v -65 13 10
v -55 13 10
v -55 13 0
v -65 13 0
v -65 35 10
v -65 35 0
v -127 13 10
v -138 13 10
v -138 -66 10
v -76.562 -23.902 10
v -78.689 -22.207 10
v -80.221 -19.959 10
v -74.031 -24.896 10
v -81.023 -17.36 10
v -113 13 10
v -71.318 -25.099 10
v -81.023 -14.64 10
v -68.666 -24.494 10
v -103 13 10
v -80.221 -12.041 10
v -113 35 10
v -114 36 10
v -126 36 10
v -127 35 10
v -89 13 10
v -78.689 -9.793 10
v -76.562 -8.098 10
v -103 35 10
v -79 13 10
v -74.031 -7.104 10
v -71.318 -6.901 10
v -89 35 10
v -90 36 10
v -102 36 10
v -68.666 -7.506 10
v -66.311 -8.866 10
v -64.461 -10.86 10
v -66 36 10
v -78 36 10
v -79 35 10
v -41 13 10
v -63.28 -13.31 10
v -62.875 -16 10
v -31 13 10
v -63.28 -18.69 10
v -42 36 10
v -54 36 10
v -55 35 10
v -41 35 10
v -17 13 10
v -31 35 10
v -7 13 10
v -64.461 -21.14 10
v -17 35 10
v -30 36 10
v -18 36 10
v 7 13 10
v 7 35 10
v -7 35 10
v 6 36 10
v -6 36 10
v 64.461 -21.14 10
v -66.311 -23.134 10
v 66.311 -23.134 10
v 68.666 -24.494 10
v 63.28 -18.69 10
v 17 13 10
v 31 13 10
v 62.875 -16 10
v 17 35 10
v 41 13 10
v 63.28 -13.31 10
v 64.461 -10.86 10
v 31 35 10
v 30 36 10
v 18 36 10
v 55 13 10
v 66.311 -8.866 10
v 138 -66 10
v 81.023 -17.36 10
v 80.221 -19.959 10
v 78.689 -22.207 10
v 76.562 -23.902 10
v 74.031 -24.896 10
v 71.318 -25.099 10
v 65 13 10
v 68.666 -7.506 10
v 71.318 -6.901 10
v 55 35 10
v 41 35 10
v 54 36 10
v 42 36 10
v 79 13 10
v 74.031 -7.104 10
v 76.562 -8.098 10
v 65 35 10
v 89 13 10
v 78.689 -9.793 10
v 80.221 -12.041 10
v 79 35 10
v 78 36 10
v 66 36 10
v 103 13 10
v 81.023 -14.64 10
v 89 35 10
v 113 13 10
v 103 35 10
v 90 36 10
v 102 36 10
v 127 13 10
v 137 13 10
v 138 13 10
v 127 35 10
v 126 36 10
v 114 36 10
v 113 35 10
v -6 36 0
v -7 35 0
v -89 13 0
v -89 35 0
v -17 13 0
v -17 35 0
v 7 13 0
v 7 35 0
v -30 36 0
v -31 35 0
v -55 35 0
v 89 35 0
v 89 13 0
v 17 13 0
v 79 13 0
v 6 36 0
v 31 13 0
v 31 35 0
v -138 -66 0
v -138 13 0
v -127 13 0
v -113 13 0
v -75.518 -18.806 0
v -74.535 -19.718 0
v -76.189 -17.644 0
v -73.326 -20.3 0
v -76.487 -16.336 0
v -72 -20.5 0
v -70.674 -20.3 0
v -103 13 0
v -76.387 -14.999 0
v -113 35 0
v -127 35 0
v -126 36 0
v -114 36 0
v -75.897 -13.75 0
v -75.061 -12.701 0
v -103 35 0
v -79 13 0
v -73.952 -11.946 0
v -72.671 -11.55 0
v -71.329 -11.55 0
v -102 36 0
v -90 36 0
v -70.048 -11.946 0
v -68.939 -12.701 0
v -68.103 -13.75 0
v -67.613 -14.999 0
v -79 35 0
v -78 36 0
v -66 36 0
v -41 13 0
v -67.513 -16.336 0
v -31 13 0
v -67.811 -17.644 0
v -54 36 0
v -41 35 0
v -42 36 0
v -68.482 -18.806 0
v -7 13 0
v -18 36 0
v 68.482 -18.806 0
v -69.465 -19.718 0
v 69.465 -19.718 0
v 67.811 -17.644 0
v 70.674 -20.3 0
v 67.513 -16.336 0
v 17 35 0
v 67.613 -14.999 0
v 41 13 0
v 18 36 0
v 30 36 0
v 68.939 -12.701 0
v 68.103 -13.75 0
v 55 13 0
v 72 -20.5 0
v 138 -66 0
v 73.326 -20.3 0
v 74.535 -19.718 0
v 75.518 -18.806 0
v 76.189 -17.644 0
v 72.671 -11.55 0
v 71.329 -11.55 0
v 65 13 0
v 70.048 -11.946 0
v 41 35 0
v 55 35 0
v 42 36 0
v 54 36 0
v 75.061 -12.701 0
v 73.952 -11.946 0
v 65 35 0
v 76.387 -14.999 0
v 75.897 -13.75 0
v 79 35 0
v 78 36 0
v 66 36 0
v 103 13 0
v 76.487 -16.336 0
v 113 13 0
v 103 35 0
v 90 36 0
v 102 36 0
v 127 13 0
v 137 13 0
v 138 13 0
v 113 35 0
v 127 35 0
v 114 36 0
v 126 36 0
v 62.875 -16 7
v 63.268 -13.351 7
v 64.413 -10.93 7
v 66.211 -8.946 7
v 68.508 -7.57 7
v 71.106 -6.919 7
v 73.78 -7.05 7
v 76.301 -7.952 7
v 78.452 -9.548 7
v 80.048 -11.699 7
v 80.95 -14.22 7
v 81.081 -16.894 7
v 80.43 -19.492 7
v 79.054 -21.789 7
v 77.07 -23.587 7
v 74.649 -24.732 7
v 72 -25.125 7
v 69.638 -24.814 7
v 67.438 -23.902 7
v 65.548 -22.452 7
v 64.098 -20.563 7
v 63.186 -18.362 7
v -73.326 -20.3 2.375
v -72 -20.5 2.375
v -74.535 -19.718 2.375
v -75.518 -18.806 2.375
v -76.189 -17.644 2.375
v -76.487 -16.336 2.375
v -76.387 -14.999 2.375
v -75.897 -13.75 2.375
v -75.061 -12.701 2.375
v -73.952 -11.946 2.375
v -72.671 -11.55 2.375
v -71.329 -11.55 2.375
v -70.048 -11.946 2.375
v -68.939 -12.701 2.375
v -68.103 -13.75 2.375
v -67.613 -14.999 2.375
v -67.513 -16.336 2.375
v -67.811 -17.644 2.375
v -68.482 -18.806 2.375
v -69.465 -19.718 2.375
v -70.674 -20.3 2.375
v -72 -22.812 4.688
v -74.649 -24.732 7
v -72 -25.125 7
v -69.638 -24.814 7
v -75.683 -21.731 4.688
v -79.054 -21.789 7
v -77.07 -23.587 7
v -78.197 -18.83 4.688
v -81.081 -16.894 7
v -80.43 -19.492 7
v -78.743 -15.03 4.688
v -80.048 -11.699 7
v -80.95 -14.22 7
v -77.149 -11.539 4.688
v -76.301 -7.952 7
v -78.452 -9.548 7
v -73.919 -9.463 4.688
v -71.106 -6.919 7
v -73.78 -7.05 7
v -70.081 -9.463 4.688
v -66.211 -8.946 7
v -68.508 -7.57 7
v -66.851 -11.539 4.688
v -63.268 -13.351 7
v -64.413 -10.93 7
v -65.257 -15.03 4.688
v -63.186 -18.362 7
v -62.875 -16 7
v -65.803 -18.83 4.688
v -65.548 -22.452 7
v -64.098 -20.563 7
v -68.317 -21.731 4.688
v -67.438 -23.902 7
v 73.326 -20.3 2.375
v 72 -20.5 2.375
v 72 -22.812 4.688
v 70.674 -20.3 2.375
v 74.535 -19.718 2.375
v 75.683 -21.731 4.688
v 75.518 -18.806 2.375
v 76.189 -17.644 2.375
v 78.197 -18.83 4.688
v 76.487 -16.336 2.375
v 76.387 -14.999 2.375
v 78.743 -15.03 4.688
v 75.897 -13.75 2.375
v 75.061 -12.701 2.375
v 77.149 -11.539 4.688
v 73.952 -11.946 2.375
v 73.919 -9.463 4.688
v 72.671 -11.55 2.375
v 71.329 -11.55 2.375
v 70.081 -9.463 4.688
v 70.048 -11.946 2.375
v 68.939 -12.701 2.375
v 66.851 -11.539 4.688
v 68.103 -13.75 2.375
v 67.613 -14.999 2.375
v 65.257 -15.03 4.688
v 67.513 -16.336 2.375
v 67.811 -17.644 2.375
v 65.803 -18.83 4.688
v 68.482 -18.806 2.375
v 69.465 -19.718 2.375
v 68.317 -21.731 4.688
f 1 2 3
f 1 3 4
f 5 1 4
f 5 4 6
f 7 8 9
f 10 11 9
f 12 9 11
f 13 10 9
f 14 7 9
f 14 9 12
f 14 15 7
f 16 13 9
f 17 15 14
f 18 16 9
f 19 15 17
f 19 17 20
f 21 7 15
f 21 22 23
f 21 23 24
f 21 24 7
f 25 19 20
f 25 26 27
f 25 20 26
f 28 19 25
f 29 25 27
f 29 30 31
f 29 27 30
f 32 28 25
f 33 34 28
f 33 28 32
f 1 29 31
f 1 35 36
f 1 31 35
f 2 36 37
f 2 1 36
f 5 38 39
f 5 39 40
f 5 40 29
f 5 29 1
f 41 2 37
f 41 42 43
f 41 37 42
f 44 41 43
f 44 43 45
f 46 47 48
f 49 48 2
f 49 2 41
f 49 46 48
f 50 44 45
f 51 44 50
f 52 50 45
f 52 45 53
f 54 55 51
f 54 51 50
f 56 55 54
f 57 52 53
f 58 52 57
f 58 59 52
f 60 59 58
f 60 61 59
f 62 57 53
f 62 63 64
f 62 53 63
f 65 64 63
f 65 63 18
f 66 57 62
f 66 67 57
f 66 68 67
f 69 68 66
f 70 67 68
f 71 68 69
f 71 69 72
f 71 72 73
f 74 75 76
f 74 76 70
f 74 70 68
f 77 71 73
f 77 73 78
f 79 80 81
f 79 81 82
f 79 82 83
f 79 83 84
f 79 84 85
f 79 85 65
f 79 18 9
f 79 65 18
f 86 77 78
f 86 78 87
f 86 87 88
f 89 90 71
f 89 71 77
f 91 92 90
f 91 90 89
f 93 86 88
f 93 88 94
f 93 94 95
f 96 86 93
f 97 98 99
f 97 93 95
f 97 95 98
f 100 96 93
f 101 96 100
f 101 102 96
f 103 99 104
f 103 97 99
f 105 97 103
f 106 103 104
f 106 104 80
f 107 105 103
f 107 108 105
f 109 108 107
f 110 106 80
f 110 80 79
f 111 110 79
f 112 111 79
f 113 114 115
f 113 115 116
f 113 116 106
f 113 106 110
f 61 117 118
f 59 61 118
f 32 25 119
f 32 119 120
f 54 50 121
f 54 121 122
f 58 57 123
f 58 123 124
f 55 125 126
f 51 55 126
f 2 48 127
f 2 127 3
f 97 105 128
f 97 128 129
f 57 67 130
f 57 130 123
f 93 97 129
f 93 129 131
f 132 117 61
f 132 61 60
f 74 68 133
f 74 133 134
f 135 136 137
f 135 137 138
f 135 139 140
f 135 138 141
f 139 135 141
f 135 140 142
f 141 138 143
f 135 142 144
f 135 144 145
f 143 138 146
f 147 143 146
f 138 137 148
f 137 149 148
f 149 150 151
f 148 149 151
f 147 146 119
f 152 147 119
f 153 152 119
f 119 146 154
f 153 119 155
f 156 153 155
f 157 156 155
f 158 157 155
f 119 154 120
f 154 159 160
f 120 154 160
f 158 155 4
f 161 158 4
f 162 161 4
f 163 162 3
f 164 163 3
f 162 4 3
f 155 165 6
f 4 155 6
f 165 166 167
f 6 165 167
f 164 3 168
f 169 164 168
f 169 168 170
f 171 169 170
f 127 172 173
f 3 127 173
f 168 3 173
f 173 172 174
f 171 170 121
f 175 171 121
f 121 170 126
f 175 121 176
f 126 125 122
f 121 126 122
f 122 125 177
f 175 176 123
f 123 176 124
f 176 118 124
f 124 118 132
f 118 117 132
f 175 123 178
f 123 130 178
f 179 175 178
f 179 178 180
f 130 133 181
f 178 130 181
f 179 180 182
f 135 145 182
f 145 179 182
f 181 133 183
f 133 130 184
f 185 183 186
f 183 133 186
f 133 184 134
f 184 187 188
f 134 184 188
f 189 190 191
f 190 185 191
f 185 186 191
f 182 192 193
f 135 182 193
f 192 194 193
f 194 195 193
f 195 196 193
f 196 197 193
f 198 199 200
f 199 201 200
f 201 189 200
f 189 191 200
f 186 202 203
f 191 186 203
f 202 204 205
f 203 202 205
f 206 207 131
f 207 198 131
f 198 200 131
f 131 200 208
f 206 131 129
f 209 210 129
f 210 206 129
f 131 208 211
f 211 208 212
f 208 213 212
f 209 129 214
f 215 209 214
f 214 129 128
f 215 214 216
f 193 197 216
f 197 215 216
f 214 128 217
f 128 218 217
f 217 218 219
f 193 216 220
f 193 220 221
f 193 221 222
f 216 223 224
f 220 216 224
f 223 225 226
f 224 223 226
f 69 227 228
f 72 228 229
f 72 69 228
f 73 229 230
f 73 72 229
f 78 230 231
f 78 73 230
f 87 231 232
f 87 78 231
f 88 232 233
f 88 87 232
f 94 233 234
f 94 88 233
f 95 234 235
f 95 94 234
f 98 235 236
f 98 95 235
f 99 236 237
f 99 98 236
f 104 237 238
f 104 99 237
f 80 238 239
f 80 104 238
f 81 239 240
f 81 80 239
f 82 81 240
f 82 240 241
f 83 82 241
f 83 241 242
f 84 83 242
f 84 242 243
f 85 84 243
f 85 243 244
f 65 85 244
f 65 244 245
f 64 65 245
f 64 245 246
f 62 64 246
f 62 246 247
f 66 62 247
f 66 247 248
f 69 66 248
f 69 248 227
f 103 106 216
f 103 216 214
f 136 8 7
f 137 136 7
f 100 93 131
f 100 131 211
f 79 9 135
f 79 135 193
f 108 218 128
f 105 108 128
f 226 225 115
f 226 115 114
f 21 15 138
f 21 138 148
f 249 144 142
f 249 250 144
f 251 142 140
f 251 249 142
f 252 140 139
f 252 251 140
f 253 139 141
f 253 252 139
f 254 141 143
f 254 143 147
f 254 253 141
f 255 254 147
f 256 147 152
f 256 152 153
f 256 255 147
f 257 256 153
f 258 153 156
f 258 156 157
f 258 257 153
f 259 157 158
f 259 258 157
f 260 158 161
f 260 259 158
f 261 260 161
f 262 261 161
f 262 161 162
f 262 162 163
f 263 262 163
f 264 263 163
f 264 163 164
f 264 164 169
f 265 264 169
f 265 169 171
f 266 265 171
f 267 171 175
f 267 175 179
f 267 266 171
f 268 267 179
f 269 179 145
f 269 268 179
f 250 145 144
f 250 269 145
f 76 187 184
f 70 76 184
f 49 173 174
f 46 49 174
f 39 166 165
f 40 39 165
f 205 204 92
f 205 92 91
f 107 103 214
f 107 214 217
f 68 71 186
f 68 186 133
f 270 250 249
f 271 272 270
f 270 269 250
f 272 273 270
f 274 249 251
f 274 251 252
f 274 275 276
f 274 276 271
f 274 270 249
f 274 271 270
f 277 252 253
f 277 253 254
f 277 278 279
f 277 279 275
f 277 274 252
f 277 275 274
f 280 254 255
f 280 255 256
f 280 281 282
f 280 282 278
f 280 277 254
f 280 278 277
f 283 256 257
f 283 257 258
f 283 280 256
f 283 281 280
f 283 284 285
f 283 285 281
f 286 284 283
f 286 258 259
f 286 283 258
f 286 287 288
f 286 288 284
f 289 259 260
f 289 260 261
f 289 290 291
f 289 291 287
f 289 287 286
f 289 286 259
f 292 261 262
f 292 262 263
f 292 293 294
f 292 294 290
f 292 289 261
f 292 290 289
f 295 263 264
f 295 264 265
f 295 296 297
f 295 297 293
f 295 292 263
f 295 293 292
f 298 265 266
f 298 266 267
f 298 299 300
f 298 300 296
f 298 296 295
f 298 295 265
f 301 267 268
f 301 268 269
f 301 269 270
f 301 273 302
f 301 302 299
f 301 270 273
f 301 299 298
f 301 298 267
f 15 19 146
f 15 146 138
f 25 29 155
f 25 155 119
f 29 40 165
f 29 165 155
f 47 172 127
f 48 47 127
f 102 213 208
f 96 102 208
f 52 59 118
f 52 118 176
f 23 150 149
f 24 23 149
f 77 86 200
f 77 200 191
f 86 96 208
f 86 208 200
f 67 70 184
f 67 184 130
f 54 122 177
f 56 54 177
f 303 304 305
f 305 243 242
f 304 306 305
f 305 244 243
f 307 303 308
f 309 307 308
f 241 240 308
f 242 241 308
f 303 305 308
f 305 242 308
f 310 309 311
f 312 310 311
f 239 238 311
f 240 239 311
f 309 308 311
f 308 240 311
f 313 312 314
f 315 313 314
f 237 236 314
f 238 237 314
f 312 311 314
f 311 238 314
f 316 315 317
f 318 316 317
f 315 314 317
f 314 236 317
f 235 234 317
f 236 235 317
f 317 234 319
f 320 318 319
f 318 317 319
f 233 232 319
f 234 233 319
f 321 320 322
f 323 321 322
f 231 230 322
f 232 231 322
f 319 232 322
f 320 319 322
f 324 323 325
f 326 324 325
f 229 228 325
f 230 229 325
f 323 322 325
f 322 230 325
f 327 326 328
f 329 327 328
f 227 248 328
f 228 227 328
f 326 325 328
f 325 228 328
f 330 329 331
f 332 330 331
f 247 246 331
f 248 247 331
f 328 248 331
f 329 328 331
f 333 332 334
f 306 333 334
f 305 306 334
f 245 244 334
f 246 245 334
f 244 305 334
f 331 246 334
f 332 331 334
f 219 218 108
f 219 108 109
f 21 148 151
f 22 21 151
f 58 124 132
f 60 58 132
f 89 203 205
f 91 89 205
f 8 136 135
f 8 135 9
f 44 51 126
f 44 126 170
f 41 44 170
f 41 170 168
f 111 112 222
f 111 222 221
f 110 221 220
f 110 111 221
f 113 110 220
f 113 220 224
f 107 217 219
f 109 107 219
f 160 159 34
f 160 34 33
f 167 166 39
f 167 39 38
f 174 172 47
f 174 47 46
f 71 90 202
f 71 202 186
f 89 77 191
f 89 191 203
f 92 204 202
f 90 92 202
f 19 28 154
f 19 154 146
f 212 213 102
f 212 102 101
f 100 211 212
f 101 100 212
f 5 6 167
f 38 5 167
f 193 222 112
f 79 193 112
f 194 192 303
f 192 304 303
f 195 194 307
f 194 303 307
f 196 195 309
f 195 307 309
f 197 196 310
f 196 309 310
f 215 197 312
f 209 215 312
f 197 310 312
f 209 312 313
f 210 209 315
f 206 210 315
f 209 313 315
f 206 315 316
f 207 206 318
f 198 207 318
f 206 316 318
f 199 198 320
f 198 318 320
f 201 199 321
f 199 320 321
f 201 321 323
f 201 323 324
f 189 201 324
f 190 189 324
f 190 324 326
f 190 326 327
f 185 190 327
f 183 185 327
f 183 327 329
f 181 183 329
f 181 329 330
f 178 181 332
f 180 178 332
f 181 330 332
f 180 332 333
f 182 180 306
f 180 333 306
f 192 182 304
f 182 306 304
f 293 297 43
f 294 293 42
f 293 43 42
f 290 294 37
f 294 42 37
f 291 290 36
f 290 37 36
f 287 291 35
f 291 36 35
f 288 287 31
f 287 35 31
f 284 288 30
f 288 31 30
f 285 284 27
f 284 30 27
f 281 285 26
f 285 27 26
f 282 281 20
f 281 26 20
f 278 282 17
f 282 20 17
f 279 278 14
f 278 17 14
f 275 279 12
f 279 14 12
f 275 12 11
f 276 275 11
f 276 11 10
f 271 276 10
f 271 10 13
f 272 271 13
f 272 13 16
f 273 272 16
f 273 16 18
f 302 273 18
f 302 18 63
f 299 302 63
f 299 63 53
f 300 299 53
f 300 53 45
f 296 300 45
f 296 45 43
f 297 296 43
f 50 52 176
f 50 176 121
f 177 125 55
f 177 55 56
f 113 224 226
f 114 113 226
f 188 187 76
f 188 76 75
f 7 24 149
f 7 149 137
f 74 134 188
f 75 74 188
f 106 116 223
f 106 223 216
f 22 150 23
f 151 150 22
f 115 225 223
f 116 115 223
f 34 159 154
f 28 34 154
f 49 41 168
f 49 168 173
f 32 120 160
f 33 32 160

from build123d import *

# Parameters (mm, degrees)
SKETCH_1_W                  = 276
SKETCH_1_H                  = 72
EXTRUDE_1_DEPTH             = 10
CUT_EXTRUDE_1_DEPTH         = 10
SKETCH_6_W                  = 276
SKETCH_6_H                  = 10
EXTRUDE_2_DEPTH             = 30
PATTERN_LINEAR_2_COUNT      = 7
PATTERN_LINEAR_2_PITCH      = 24
PATTERN_LINEAR_2_COUNT_DIR2 = 7
PATTERN_LINEAR_2_PITCH_DIR2 = 24
SKETCH_3_R                  = 4
CUT_EXTRUDE_2_DEPTH         = 10
SKETCH_7_R                  = 9.125
CUT_EXTRUDE_3_DEPTH         = 3
SKETCH_13_W                 = 13.976331663
SKETCH_13_H                 = 30.85518014
SKETCH_13_W_2               = 8.289840829
SKETCH_13_H_2               = 27.158961097
CUT_EXTRUDE_4_DEPTH         = 10


with BuildPart() as part:
    # Эскиз1 → Бобышка-Вытянуть1 (new body)
    with BuildSketch(Plane.XY):
        Rectangle(SKETCH_1_W, SKETCH_1_H)
    extrude(amount=EXTRUDE_1_DEPTH)

    # Эскиз2 → Вырез-Вытянуть1 (cut)
    with BuildSketch(Plane.XY.offset(10)):
        Polygon((-18, 36), (-6, 36), (-7, 35), (-7, 13), (-17, 13), (-17, 35), align=None)
    cut_extrude_1 = extrude(amount=-CUT_EXTRUDE_1_DEPTH, mode=Mode.SUBTRACT)

    # Эскиз6 → Бобышка-Вытянуть2 (add)
    with BuildSketch(Plane.XZ.offset(36)):
        with Locations((0, 5)):
            Rectangle(SKETCH_6_W, SKETCH_6_H)
    extrude(amount=EXTRUDE_2_DEPTH)

    # Линейный массив2: Cut-Extrude 1 7 × 7
    with Locations(*[Vector(1, 0, 0) * (i * PATTERN_LINEAR_2_PITCH) + Vector(-1, 0, 0) * (j * PATTERN_LINEAR_2_PITCH_DIR2) for i in range(PATTERN_LINEAR_2_COUNT) for j in range(PATTERN_LINEAR_2_COUNT_DIR2) if (i, j) != (0, 0)]):
        add(cut_extrude_1, mode=Mode.SUBTRACT)

    # Эскиз3 → Вырез-Вытянуть2 (cut)
    with BuildSketch(Plane.XY.offset(10)):
        with Locations((-72, -16)):
            Circle(SKETCH_3_R)
    cut_extrude_2 = extrude(amount=-CUT_EXTRUDE_2_DEPTH, mode=Mode.SUBTRACT)

    # Эскиз7 → Вырез-Вытянуть3 (cut)
    with BuildSketch(Plane.XY.offset(10)):
        with Locations((-72, -16)):
            Circle(SKETCH_7_R)
    cut_extrude_3 = extrude(amount=-CUT_EXTRUDE_3_DEPTH, mode=Mode.SUBTRACT)

    # Эскиз12 → Зенковка для винта с потайной головкой и внутренним шестигранником M82 (revolve, cut)
    with BuildSketch(Plane(origin=(-72, -16, 7), x_dir=(0, -1, 0), z_dir=(1, 0, 0))):
        Polygon((0, 0), (0, 7), (4.5, 7), (4.5, 4.625), (9.125, 0), align=None)
    hole_wizard_m82 = revolve(axis=Axis((-72, -16, 13.35), (0, 0, -1)), mode=Mode.SUBTRACT)

    # Зеркальное отражение2: Вырез-Вытянуть2, Вырез-Вытянуть3, Зенковка для винта с потайной головкой и внутренним шестигранником M82 across plane
    add(cut_extrude_2.mirror(Plane(origin=(0, 0, 0), x_dir=(0, 0, 1), z_dir=(1, 0, 0))), mode=Mode.SUBTRACT)
    add(cut_extrude_3.mirror(Plane(origin=(0, 0, 0), x_dir=(0, 0, 1), z_dir=(1, 0, 0))), mode=Mode.SUBTRACT)
    add(hole_wizard_m82.mirror(Plane(origin=(0, 0, 0), x_dir=(0, 0, 1), z_dir=(1, 0, 0))), mode=Mode.SUBTRACT)

    # Эскиз13 → Вырез-Вытянуть4 (cut)
    with BuildSketch(Plane.XY.offset(10)):
        with Locations((-143.988165831, 28.42759007)):
            Rectangle(SKETCH_13_W, SKETCH_13_H)
        with Locations((141.144920415, 26.579480549)):
            Rectangle(SKETCH_13_W_2, SKETCH_13_H_2)
    extrude(amount=-CUT_EXTRUDE_4_DEPTH, mode=Mode.SUBTRACT)


solid = part.part
